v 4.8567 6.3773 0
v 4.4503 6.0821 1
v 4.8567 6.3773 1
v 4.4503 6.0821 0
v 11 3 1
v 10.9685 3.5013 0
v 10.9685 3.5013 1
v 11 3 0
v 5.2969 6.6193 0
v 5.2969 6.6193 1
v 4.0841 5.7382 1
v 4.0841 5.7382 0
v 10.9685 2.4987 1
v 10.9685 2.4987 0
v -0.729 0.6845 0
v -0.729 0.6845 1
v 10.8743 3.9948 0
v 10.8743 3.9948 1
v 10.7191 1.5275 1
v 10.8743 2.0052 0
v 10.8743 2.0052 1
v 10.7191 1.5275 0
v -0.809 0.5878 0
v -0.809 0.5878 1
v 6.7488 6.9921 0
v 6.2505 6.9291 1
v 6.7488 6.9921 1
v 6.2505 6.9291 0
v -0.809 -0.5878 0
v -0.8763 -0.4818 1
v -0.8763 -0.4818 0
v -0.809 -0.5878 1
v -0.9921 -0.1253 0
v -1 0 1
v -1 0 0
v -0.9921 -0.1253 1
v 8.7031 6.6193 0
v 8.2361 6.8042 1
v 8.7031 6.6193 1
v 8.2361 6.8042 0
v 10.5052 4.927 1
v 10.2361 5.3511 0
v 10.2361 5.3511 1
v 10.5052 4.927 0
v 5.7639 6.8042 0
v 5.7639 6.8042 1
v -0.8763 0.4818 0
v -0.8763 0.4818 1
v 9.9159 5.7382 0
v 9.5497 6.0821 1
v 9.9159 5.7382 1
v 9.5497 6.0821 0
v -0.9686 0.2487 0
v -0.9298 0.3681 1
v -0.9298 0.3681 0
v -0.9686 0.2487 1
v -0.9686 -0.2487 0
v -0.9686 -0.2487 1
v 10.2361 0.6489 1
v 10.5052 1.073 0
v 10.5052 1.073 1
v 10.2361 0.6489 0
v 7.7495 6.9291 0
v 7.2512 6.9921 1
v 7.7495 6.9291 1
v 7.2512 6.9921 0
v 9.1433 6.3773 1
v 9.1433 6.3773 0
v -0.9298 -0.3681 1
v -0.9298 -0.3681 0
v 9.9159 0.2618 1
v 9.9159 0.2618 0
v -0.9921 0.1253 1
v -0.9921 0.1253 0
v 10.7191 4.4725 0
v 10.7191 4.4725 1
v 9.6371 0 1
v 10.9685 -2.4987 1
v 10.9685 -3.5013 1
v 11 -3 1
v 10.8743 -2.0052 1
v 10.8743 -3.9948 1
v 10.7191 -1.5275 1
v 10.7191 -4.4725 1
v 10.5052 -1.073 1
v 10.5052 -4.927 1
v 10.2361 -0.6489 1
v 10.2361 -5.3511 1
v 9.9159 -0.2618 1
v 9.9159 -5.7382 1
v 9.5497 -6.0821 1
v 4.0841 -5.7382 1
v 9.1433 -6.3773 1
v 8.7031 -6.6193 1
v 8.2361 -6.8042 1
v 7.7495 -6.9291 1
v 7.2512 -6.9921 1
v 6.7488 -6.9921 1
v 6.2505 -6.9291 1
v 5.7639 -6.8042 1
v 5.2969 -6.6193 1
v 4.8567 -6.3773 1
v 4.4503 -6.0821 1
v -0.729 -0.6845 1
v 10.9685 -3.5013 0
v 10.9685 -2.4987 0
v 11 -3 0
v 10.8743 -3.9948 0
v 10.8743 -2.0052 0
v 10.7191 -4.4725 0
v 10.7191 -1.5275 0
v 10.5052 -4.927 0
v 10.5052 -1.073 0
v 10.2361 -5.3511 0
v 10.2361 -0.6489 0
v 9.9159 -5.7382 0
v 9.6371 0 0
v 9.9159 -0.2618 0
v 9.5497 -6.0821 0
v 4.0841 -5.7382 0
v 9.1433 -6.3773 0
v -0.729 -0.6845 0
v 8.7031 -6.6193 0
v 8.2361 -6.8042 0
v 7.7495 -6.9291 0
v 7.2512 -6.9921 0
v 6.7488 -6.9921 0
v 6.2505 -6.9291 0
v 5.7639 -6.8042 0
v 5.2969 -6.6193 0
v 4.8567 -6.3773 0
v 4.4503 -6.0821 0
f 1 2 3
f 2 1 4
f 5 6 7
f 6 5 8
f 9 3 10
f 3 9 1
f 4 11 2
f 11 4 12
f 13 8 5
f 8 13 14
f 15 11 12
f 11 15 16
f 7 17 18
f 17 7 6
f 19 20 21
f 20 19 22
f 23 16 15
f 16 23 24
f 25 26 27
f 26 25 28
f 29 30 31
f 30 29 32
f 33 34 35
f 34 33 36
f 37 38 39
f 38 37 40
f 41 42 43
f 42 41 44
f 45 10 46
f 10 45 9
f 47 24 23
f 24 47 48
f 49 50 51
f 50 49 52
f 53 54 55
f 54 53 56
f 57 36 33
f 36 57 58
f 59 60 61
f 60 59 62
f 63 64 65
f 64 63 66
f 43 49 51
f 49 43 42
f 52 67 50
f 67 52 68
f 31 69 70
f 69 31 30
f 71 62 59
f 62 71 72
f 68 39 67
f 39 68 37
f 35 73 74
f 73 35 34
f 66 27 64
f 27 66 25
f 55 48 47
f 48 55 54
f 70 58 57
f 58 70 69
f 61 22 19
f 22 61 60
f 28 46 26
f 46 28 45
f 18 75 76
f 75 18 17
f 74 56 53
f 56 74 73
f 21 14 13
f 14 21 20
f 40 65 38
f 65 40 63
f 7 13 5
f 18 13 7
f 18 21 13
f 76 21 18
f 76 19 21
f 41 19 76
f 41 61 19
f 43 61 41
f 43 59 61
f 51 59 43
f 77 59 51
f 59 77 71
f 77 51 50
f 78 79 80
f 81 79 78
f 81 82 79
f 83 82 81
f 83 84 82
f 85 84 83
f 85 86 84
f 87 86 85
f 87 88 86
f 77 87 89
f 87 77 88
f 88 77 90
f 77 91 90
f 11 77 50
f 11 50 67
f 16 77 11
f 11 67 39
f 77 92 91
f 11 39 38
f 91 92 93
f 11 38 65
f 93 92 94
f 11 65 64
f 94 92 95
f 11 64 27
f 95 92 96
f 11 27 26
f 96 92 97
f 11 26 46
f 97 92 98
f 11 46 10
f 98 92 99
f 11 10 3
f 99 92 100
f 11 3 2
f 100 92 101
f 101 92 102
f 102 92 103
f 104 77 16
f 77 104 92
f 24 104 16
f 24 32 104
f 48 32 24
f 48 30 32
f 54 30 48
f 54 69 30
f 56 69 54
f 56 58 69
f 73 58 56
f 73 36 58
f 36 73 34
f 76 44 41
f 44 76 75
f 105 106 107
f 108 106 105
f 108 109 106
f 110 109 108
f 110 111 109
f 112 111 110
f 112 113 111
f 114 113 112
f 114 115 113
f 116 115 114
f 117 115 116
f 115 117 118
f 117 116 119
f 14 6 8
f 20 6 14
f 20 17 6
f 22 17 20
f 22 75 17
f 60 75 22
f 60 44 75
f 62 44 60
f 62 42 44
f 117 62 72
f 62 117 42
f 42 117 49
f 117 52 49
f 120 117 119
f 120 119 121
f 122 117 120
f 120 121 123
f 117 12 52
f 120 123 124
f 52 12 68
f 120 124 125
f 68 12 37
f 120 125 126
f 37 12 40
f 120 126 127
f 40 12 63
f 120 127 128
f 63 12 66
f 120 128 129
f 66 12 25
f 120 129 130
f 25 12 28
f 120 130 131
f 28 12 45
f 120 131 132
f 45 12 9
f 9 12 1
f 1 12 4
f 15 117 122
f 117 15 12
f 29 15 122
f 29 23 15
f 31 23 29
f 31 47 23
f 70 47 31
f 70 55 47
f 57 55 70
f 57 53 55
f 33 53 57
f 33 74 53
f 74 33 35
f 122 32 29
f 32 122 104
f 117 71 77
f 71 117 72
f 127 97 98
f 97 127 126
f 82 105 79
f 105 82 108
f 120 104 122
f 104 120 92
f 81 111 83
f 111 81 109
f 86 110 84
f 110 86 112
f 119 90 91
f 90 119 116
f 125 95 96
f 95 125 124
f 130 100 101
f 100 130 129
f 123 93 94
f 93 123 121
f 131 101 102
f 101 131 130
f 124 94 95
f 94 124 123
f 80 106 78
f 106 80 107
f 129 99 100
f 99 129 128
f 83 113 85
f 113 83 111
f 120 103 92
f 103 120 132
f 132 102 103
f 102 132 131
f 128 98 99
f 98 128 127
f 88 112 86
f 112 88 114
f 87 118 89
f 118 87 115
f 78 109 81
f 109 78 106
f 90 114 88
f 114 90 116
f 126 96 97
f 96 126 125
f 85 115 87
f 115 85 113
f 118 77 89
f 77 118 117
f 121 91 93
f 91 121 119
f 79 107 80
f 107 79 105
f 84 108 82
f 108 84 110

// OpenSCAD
$fn = 50;
// union() {
// translate([-5, 5, 0]) cylinder(2, 5, 5);
// translate([5, 5, 0]) cylinder(2, 5, 5);

// translate([0,-10,0]) rotate(45) cube([15, 15, 2]);
// }


hull() {
    cylinder(h=1, r1=1, r2=1);
    translate([7, 3, 0]) cylinder(h=1, r1=4, r2=4);
}

mirror([0, 1, 0]) hull() {
    cylinder(h=1, r1=1, r2=1);
    translate([7, 3, 0]) cylinder(h=1, r1=4, r2=4);
}
